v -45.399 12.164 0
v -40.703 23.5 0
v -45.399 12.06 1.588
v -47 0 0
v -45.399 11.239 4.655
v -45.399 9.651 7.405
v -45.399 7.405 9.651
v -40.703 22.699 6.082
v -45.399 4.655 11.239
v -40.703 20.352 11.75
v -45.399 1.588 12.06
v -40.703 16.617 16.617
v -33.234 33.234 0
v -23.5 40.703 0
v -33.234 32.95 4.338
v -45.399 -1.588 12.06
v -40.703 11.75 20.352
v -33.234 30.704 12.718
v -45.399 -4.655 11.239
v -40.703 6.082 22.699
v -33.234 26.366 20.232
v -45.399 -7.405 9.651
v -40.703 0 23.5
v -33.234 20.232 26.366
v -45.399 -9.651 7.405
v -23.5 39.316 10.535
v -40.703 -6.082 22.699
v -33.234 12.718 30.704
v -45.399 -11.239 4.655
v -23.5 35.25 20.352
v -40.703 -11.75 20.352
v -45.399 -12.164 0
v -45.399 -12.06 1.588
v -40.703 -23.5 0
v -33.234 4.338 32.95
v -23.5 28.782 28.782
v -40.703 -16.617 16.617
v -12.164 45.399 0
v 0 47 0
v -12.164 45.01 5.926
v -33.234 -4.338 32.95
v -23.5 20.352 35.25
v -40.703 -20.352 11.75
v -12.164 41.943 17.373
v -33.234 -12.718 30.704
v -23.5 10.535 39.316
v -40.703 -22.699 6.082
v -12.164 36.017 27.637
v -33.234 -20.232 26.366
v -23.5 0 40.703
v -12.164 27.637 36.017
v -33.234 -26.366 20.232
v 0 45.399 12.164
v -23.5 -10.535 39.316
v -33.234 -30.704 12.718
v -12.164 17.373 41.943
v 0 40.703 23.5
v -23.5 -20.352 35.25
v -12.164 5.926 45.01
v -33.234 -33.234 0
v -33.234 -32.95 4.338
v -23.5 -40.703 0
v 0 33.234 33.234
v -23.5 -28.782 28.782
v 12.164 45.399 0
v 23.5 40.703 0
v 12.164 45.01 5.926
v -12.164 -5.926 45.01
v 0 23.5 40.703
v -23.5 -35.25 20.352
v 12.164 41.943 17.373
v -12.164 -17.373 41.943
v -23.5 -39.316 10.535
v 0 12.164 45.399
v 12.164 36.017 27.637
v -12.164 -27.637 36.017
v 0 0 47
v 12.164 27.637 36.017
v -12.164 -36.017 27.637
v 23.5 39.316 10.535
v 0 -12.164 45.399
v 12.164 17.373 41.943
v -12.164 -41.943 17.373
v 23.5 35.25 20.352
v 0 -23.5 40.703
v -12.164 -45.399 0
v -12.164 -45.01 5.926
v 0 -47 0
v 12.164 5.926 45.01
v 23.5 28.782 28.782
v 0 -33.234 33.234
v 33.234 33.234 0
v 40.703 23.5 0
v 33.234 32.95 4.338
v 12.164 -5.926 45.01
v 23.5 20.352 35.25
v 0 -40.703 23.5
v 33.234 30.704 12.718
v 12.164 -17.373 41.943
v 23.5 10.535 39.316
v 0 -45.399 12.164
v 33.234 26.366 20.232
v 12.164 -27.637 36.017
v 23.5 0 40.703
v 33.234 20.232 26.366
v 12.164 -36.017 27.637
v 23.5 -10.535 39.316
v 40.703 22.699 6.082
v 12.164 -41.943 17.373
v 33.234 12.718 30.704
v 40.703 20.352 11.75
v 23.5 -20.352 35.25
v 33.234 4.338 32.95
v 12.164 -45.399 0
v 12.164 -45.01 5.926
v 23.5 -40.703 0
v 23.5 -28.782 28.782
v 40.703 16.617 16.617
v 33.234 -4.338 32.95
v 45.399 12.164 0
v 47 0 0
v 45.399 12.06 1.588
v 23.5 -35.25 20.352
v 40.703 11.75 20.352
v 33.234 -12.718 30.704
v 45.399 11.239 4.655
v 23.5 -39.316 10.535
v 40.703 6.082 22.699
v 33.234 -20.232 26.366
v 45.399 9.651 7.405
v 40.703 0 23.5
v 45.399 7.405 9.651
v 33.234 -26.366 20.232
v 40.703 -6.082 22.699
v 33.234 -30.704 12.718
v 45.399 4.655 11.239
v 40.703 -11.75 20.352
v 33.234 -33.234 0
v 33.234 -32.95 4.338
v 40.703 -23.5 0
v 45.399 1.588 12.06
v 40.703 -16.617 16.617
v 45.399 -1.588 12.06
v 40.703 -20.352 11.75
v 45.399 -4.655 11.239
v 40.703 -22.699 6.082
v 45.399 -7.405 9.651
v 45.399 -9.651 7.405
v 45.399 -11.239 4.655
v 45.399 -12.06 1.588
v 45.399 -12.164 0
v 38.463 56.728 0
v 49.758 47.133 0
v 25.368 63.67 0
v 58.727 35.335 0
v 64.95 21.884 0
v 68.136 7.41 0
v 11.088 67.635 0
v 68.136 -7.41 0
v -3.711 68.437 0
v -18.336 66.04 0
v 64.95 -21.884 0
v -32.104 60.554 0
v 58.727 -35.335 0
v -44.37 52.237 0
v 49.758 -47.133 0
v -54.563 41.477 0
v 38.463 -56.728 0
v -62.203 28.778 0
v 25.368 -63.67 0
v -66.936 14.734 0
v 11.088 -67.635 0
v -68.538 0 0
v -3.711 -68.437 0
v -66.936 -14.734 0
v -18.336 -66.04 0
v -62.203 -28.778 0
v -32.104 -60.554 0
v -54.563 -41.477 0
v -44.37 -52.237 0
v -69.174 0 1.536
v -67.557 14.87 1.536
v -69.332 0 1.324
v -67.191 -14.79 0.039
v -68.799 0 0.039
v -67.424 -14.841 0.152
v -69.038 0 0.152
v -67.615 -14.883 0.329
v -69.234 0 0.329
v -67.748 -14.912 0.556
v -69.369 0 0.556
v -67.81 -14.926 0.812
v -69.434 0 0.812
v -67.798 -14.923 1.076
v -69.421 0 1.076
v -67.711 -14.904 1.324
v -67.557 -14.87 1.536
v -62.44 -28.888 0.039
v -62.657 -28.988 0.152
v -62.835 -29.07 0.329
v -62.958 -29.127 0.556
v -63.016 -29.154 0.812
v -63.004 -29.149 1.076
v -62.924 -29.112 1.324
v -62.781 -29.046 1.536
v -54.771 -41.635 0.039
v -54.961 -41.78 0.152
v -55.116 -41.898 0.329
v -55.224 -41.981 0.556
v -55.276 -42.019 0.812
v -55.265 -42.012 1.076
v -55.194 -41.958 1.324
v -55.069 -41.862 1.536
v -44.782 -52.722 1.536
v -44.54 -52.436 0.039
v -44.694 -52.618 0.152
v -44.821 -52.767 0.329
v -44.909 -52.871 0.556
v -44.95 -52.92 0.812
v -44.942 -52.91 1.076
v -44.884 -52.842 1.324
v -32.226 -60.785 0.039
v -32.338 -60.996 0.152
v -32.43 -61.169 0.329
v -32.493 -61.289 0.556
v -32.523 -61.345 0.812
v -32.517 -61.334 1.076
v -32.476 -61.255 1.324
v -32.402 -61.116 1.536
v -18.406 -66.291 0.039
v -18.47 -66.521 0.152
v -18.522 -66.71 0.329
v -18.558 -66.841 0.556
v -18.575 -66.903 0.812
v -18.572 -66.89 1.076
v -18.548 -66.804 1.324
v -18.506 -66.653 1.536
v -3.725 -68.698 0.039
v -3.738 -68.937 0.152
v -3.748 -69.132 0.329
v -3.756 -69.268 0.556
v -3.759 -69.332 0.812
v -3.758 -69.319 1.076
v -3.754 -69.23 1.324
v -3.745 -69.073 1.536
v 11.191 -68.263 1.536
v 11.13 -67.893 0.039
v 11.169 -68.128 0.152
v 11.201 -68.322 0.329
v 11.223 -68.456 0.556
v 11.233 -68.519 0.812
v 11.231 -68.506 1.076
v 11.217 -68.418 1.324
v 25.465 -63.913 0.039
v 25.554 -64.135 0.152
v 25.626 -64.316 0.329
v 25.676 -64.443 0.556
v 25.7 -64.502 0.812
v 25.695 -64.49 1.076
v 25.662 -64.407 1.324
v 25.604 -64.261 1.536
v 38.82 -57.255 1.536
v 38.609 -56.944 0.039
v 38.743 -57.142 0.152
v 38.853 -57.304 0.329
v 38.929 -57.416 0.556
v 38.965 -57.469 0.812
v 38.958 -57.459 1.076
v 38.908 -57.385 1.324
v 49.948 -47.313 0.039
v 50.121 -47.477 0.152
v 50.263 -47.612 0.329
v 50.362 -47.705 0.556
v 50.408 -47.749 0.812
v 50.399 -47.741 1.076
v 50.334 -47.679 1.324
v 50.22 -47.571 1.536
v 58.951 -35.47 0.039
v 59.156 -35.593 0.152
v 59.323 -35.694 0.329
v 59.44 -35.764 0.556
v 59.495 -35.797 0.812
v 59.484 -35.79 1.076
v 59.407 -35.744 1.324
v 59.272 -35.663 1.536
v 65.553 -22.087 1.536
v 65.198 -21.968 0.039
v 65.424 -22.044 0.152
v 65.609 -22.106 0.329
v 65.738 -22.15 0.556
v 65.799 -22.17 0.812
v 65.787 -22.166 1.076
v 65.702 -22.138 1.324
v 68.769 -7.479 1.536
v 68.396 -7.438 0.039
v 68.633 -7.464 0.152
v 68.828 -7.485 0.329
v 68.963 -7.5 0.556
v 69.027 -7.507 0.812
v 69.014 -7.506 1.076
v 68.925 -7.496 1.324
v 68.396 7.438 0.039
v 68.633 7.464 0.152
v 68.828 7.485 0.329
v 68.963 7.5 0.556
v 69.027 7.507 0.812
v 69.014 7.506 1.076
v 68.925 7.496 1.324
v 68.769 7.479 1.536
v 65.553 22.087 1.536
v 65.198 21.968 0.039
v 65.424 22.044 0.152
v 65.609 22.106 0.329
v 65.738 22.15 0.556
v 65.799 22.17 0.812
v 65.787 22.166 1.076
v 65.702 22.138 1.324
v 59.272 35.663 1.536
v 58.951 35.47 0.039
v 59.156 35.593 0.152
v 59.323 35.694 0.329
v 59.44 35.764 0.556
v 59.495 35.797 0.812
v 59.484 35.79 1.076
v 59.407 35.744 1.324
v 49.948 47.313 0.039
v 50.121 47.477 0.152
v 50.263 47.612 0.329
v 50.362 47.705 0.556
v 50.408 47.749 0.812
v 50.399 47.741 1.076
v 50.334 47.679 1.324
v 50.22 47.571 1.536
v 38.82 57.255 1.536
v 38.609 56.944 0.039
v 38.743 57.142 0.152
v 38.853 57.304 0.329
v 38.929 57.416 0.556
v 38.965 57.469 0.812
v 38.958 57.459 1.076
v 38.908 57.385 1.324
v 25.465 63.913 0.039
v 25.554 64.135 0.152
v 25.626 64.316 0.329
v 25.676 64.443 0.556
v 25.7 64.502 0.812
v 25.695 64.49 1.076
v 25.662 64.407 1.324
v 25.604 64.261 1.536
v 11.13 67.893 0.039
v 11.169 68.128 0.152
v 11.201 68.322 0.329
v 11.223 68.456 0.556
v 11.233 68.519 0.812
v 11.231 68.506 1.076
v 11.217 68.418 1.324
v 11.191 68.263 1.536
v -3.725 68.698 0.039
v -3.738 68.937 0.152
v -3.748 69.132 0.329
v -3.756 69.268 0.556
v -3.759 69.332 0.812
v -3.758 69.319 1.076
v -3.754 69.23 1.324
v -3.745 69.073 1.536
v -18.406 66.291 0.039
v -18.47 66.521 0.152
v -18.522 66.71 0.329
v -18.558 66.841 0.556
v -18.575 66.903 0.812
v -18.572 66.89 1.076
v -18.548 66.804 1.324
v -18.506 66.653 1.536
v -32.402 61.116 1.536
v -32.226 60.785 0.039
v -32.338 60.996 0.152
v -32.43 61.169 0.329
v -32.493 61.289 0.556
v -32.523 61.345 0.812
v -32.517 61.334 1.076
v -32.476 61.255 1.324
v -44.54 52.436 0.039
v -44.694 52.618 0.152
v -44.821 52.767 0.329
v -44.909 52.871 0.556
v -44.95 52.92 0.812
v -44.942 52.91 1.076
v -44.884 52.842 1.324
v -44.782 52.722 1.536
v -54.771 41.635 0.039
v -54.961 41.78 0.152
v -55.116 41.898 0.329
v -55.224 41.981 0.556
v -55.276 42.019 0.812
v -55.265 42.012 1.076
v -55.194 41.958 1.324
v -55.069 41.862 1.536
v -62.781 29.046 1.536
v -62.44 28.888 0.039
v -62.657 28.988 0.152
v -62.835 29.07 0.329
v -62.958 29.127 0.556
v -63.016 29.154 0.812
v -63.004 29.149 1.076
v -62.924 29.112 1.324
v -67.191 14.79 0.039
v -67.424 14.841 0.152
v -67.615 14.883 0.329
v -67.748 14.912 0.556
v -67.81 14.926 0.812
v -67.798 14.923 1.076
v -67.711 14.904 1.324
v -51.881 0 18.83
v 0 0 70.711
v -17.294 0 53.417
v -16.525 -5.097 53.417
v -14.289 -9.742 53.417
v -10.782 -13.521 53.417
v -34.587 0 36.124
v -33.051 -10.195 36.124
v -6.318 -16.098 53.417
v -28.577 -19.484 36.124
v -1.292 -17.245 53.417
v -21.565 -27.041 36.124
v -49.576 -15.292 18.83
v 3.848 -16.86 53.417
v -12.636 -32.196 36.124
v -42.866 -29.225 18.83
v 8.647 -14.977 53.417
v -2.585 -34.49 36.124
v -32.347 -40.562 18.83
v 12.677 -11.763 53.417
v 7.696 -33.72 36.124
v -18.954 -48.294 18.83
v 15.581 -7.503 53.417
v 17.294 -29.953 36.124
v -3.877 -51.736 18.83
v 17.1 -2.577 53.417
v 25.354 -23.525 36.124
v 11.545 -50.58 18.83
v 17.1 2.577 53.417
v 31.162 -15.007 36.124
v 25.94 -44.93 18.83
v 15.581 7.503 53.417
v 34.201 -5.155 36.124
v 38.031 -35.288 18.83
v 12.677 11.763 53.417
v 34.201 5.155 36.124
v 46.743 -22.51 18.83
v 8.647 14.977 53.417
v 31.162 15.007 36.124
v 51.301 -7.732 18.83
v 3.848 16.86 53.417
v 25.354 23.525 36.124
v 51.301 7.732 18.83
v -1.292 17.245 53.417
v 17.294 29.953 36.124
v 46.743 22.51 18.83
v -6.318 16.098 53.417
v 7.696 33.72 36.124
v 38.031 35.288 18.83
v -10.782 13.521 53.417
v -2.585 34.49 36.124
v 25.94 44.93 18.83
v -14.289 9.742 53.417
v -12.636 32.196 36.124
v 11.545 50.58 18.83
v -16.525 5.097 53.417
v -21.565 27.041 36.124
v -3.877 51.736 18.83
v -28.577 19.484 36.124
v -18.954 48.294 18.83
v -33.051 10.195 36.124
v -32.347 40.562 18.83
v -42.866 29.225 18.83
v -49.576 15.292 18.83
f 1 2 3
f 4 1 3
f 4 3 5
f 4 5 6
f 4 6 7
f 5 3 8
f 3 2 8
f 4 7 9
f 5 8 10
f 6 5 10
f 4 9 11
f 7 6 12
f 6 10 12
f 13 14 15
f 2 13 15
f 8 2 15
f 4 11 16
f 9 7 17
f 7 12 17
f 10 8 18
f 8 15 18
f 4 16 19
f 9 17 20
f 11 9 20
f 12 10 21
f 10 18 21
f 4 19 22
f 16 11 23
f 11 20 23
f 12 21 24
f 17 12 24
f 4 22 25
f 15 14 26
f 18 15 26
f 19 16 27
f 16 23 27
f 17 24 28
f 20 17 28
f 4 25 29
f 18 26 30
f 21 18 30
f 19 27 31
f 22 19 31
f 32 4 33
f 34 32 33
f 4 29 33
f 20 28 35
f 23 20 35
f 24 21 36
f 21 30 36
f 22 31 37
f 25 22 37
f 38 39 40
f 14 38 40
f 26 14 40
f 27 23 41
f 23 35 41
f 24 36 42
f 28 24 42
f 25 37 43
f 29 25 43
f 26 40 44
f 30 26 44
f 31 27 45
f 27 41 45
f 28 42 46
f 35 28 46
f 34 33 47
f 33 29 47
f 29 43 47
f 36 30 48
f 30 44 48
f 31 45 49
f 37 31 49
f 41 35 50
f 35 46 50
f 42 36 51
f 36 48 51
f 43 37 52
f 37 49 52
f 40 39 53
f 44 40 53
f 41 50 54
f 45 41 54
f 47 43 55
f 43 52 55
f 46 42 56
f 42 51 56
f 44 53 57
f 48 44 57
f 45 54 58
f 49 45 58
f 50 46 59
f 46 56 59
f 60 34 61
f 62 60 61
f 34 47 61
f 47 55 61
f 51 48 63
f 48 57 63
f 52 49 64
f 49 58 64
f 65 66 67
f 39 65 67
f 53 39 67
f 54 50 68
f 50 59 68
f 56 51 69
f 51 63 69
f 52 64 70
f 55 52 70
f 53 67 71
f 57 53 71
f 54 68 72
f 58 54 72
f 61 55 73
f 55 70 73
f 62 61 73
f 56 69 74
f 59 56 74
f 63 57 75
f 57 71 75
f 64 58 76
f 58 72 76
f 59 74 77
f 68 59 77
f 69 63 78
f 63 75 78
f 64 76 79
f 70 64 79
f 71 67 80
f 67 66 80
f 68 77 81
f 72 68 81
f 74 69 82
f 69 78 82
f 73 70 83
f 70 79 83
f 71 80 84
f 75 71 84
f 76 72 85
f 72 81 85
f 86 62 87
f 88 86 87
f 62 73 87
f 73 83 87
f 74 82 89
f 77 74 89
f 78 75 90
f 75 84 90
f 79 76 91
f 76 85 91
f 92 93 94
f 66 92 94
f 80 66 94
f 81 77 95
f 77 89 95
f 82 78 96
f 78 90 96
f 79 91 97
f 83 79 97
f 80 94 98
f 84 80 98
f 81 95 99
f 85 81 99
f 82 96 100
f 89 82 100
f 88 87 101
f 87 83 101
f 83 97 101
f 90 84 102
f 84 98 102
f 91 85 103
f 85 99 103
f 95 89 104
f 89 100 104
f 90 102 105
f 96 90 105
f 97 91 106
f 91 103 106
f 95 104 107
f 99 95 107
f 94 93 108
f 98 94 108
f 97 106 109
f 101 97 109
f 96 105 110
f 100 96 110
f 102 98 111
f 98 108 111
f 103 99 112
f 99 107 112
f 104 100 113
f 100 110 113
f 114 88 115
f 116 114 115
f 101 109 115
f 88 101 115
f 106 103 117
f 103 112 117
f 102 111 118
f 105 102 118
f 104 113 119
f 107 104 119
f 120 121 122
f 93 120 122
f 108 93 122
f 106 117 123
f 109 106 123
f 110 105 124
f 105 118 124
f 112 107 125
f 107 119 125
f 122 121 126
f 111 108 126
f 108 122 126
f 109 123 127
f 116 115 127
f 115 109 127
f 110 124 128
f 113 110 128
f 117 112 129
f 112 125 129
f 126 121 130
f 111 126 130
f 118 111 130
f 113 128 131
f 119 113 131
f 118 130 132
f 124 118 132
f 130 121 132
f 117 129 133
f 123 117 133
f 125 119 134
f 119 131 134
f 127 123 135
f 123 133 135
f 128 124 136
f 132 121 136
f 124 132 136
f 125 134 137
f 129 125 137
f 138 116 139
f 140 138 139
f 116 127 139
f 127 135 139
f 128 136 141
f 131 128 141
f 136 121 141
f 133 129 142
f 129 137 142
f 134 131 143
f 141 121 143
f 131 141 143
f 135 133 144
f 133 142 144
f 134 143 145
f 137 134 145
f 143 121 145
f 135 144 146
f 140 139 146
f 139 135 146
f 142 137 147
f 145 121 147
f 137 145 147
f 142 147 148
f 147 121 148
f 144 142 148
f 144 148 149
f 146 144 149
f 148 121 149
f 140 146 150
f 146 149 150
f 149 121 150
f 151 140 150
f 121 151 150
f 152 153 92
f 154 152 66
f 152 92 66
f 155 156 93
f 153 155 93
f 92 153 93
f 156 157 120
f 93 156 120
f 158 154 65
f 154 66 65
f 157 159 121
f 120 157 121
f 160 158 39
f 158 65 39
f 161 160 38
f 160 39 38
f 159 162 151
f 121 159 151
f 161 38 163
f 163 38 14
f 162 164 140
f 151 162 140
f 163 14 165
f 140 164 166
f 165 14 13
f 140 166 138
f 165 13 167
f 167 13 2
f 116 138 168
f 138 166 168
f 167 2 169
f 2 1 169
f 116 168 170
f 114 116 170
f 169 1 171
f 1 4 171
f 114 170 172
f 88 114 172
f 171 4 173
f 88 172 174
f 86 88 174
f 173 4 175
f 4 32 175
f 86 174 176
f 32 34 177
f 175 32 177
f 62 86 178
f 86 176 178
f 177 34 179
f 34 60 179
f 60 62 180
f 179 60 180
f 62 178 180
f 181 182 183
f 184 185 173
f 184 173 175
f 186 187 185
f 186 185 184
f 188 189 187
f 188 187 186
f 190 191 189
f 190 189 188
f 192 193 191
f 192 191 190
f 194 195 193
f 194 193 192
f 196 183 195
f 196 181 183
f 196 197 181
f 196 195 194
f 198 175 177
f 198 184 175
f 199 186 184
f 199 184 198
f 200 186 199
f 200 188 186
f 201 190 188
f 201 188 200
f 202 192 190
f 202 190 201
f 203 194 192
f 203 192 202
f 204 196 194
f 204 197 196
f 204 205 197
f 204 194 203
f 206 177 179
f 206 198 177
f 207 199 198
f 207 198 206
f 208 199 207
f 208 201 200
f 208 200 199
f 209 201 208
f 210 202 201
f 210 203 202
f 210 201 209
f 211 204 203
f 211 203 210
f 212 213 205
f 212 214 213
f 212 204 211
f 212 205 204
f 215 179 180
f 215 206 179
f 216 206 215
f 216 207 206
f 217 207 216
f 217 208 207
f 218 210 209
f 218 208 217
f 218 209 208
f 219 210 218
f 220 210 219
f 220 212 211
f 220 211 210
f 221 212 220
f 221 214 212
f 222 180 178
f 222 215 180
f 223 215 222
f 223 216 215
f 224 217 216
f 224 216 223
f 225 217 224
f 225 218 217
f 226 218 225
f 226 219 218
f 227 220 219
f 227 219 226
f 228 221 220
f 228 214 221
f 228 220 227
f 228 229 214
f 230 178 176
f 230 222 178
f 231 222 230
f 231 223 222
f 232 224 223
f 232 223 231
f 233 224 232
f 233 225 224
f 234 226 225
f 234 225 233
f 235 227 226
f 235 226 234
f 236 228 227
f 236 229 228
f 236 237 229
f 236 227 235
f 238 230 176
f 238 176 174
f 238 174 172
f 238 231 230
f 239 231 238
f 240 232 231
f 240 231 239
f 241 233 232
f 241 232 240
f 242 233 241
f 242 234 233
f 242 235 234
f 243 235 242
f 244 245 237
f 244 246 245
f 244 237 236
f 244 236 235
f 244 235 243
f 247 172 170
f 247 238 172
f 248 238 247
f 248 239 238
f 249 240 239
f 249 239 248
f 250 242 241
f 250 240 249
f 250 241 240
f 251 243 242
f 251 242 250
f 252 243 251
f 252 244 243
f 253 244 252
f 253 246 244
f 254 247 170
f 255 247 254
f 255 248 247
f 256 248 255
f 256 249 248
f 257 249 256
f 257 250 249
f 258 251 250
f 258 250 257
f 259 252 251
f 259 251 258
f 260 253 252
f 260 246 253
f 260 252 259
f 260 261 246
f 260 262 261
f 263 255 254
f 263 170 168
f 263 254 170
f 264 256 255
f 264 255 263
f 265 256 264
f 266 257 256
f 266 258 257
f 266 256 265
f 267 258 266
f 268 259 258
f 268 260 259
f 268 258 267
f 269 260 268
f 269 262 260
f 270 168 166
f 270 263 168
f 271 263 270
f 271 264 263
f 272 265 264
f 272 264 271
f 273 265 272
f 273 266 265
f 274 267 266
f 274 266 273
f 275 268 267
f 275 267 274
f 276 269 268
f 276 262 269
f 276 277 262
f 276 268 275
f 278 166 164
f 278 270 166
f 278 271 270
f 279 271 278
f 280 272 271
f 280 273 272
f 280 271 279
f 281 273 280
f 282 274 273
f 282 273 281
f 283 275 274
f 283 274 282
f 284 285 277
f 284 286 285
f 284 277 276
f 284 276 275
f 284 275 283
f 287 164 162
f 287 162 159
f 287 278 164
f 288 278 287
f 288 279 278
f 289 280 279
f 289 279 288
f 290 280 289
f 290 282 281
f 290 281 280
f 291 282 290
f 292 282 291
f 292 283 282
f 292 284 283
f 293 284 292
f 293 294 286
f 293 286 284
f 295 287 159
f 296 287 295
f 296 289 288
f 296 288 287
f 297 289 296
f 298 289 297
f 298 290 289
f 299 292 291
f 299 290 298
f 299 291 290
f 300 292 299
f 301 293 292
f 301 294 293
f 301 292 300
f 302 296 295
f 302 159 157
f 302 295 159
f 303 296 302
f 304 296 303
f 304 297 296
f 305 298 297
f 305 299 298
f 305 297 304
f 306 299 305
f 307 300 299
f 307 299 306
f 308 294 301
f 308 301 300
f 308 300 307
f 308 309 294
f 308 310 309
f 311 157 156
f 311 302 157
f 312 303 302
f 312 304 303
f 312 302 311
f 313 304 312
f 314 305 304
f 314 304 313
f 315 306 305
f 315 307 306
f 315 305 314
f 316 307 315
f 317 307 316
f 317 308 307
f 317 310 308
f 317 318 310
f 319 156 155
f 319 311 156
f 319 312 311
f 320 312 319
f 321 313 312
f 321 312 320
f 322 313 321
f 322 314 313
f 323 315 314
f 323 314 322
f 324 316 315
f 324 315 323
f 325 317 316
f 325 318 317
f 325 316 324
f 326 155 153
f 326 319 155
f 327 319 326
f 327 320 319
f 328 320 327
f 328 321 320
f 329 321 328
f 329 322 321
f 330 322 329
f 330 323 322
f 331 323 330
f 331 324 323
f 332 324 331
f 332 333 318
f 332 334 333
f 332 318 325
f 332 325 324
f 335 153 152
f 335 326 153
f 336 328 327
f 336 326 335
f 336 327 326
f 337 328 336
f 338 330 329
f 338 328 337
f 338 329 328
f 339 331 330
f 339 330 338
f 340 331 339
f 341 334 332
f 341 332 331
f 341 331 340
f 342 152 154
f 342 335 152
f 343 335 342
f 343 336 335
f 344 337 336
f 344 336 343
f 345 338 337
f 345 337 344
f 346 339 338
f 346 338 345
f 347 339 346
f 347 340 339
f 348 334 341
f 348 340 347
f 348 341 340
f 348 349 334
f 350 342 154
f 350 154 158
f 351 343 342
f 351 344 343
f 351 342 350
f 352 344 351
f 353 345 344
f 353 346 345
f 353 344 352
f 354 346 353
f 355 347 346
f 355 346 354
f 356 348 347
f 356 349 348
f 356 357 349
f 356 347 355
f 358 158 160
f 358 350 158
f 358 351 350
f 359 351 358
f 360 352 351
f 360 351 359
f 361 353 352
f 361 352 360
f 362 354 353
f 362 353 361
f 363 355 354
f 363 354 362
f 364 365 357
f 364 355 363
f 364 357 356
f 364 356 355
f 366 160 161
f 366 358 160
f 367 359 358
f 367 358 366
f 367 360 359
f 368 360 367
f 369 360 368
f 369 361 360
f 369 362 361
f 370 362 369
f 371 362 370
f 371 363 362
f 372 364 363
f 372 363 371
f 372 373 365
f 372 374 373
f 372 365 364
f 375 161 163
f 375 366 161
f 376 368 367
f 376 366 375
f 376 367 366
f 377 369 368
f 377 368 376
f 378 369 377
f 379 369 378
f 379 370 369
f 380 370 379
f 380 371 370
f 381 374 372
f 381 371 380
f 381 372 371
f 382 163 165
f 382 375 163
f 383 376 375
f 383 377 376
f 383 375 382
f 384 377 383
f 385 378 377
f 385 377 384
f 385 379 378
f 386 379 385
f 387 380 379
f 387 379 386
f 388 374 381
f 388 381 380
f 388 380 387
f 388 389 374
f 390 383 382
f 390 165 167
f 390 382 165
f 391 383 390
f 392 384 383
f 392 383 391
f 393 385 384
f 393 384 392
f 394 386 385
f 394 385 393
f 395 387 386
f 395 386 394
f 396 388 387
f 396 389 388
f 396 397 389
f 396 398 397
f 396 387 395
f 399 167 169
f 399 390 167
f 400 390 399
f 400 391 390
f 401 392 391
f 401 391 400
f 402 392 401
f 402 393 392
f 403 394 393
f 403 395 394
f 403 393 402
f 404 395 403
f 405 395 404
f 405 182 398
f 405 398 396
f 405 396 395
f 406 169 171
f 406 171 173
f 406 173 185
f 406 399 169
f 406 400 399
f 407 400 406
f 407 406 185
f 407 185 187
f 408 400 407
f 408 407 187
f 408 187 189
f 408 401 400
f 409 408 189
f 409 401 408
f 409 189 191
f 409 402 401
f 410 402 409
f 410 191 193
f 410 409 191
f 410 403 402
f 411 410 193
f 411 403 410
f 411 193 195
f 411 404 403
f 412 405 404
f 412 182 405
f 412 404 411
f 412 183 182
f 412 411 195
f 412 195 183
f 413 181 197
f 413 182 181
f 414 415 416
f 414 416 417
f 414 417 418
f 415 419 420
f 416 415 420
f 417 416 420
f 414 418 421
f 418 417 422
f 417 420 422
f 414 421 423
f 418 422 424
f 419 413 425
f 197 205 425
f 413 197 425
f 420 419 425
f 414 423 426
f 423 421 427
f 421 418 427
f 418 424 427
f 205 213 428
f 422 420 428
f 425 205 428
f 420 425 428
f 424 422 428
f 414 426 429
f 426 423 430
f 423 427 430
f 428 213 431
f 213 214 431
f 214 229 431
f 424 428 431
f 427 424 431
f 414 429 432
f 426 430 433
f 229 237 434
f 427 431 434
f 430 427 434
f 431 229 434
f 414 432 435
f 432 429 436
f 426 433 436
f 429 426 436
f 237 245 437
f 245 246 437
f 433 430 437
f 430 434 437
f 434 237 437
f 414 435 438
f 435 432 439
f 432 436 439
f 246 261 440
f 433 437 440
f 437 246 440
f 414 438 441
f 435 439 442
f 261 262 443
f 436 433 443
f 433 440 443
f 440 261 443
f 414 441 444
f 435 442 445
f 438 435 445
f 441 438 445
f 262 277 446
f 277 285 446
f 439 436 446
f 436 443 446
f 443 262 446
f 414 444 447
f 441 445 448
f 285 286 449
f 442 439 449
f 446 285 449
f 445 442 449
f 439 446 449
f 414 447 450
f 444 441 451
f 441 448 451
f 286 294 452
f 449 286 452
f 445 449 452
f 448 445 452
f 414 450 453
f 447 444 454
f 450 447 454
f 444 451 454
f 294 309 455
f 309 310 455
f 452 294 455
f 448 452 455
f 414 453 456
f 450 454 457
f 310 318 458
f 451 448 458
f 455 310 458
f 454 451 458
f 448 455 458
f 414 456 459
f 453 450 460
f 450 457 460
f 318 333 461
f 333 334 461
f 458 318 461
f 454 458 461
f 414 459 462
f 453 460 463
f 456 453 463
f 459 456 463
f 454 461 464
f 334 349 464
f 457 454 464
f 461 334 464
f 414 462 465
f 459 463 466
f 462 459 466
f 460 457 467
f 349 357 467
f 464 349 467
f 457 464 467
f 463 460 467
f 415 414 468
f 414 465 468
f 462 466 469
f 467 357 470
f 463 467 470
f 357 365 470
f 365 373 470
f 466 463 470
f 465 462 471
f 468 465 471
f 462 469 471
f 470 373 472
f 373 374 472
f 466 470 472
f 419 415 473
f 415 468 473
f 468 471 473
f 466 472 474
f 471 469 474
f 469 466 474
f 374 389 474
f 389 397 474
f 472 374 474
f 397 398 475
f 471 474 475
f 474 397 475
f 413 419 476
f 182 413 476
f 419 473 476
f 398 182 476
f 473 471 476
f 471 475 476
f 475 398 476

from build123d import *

# Parameters (mm, degrees)
F4_R = 0.9


with BuildPart() as f1:
    # F0 (on Front) → F1 (revolve)
    with BuildSketch(Plane.XZ):
        Polygon((-70.710678, 0), (0, 0), (0, 70.710678), align=None)
    revolve(axis=Axis((0, 0, 35.355339), (0, 0, 1)))

    # F2 (on Front) → F3 (revolve, cut)
    with BuildSketch(Plane.XZ):
        with BuildLine():
            ThreePointArc((-47, 0), (0, -47), (47, 0))
            Line((47, 0), (-47, 0))
        make_face()
    revolve(axis=Axis((0, 0, 0), (1, 0, 0)), mode=Mode.SUBTRACT)

    # F4
    f4_edges = [f1.edges().sort_by_distance(p)[0] for p in [
        (70.710678, 0, 0),
    ]]
    fillet(f4_edges, radius=F4_R)


solid = f1.part
